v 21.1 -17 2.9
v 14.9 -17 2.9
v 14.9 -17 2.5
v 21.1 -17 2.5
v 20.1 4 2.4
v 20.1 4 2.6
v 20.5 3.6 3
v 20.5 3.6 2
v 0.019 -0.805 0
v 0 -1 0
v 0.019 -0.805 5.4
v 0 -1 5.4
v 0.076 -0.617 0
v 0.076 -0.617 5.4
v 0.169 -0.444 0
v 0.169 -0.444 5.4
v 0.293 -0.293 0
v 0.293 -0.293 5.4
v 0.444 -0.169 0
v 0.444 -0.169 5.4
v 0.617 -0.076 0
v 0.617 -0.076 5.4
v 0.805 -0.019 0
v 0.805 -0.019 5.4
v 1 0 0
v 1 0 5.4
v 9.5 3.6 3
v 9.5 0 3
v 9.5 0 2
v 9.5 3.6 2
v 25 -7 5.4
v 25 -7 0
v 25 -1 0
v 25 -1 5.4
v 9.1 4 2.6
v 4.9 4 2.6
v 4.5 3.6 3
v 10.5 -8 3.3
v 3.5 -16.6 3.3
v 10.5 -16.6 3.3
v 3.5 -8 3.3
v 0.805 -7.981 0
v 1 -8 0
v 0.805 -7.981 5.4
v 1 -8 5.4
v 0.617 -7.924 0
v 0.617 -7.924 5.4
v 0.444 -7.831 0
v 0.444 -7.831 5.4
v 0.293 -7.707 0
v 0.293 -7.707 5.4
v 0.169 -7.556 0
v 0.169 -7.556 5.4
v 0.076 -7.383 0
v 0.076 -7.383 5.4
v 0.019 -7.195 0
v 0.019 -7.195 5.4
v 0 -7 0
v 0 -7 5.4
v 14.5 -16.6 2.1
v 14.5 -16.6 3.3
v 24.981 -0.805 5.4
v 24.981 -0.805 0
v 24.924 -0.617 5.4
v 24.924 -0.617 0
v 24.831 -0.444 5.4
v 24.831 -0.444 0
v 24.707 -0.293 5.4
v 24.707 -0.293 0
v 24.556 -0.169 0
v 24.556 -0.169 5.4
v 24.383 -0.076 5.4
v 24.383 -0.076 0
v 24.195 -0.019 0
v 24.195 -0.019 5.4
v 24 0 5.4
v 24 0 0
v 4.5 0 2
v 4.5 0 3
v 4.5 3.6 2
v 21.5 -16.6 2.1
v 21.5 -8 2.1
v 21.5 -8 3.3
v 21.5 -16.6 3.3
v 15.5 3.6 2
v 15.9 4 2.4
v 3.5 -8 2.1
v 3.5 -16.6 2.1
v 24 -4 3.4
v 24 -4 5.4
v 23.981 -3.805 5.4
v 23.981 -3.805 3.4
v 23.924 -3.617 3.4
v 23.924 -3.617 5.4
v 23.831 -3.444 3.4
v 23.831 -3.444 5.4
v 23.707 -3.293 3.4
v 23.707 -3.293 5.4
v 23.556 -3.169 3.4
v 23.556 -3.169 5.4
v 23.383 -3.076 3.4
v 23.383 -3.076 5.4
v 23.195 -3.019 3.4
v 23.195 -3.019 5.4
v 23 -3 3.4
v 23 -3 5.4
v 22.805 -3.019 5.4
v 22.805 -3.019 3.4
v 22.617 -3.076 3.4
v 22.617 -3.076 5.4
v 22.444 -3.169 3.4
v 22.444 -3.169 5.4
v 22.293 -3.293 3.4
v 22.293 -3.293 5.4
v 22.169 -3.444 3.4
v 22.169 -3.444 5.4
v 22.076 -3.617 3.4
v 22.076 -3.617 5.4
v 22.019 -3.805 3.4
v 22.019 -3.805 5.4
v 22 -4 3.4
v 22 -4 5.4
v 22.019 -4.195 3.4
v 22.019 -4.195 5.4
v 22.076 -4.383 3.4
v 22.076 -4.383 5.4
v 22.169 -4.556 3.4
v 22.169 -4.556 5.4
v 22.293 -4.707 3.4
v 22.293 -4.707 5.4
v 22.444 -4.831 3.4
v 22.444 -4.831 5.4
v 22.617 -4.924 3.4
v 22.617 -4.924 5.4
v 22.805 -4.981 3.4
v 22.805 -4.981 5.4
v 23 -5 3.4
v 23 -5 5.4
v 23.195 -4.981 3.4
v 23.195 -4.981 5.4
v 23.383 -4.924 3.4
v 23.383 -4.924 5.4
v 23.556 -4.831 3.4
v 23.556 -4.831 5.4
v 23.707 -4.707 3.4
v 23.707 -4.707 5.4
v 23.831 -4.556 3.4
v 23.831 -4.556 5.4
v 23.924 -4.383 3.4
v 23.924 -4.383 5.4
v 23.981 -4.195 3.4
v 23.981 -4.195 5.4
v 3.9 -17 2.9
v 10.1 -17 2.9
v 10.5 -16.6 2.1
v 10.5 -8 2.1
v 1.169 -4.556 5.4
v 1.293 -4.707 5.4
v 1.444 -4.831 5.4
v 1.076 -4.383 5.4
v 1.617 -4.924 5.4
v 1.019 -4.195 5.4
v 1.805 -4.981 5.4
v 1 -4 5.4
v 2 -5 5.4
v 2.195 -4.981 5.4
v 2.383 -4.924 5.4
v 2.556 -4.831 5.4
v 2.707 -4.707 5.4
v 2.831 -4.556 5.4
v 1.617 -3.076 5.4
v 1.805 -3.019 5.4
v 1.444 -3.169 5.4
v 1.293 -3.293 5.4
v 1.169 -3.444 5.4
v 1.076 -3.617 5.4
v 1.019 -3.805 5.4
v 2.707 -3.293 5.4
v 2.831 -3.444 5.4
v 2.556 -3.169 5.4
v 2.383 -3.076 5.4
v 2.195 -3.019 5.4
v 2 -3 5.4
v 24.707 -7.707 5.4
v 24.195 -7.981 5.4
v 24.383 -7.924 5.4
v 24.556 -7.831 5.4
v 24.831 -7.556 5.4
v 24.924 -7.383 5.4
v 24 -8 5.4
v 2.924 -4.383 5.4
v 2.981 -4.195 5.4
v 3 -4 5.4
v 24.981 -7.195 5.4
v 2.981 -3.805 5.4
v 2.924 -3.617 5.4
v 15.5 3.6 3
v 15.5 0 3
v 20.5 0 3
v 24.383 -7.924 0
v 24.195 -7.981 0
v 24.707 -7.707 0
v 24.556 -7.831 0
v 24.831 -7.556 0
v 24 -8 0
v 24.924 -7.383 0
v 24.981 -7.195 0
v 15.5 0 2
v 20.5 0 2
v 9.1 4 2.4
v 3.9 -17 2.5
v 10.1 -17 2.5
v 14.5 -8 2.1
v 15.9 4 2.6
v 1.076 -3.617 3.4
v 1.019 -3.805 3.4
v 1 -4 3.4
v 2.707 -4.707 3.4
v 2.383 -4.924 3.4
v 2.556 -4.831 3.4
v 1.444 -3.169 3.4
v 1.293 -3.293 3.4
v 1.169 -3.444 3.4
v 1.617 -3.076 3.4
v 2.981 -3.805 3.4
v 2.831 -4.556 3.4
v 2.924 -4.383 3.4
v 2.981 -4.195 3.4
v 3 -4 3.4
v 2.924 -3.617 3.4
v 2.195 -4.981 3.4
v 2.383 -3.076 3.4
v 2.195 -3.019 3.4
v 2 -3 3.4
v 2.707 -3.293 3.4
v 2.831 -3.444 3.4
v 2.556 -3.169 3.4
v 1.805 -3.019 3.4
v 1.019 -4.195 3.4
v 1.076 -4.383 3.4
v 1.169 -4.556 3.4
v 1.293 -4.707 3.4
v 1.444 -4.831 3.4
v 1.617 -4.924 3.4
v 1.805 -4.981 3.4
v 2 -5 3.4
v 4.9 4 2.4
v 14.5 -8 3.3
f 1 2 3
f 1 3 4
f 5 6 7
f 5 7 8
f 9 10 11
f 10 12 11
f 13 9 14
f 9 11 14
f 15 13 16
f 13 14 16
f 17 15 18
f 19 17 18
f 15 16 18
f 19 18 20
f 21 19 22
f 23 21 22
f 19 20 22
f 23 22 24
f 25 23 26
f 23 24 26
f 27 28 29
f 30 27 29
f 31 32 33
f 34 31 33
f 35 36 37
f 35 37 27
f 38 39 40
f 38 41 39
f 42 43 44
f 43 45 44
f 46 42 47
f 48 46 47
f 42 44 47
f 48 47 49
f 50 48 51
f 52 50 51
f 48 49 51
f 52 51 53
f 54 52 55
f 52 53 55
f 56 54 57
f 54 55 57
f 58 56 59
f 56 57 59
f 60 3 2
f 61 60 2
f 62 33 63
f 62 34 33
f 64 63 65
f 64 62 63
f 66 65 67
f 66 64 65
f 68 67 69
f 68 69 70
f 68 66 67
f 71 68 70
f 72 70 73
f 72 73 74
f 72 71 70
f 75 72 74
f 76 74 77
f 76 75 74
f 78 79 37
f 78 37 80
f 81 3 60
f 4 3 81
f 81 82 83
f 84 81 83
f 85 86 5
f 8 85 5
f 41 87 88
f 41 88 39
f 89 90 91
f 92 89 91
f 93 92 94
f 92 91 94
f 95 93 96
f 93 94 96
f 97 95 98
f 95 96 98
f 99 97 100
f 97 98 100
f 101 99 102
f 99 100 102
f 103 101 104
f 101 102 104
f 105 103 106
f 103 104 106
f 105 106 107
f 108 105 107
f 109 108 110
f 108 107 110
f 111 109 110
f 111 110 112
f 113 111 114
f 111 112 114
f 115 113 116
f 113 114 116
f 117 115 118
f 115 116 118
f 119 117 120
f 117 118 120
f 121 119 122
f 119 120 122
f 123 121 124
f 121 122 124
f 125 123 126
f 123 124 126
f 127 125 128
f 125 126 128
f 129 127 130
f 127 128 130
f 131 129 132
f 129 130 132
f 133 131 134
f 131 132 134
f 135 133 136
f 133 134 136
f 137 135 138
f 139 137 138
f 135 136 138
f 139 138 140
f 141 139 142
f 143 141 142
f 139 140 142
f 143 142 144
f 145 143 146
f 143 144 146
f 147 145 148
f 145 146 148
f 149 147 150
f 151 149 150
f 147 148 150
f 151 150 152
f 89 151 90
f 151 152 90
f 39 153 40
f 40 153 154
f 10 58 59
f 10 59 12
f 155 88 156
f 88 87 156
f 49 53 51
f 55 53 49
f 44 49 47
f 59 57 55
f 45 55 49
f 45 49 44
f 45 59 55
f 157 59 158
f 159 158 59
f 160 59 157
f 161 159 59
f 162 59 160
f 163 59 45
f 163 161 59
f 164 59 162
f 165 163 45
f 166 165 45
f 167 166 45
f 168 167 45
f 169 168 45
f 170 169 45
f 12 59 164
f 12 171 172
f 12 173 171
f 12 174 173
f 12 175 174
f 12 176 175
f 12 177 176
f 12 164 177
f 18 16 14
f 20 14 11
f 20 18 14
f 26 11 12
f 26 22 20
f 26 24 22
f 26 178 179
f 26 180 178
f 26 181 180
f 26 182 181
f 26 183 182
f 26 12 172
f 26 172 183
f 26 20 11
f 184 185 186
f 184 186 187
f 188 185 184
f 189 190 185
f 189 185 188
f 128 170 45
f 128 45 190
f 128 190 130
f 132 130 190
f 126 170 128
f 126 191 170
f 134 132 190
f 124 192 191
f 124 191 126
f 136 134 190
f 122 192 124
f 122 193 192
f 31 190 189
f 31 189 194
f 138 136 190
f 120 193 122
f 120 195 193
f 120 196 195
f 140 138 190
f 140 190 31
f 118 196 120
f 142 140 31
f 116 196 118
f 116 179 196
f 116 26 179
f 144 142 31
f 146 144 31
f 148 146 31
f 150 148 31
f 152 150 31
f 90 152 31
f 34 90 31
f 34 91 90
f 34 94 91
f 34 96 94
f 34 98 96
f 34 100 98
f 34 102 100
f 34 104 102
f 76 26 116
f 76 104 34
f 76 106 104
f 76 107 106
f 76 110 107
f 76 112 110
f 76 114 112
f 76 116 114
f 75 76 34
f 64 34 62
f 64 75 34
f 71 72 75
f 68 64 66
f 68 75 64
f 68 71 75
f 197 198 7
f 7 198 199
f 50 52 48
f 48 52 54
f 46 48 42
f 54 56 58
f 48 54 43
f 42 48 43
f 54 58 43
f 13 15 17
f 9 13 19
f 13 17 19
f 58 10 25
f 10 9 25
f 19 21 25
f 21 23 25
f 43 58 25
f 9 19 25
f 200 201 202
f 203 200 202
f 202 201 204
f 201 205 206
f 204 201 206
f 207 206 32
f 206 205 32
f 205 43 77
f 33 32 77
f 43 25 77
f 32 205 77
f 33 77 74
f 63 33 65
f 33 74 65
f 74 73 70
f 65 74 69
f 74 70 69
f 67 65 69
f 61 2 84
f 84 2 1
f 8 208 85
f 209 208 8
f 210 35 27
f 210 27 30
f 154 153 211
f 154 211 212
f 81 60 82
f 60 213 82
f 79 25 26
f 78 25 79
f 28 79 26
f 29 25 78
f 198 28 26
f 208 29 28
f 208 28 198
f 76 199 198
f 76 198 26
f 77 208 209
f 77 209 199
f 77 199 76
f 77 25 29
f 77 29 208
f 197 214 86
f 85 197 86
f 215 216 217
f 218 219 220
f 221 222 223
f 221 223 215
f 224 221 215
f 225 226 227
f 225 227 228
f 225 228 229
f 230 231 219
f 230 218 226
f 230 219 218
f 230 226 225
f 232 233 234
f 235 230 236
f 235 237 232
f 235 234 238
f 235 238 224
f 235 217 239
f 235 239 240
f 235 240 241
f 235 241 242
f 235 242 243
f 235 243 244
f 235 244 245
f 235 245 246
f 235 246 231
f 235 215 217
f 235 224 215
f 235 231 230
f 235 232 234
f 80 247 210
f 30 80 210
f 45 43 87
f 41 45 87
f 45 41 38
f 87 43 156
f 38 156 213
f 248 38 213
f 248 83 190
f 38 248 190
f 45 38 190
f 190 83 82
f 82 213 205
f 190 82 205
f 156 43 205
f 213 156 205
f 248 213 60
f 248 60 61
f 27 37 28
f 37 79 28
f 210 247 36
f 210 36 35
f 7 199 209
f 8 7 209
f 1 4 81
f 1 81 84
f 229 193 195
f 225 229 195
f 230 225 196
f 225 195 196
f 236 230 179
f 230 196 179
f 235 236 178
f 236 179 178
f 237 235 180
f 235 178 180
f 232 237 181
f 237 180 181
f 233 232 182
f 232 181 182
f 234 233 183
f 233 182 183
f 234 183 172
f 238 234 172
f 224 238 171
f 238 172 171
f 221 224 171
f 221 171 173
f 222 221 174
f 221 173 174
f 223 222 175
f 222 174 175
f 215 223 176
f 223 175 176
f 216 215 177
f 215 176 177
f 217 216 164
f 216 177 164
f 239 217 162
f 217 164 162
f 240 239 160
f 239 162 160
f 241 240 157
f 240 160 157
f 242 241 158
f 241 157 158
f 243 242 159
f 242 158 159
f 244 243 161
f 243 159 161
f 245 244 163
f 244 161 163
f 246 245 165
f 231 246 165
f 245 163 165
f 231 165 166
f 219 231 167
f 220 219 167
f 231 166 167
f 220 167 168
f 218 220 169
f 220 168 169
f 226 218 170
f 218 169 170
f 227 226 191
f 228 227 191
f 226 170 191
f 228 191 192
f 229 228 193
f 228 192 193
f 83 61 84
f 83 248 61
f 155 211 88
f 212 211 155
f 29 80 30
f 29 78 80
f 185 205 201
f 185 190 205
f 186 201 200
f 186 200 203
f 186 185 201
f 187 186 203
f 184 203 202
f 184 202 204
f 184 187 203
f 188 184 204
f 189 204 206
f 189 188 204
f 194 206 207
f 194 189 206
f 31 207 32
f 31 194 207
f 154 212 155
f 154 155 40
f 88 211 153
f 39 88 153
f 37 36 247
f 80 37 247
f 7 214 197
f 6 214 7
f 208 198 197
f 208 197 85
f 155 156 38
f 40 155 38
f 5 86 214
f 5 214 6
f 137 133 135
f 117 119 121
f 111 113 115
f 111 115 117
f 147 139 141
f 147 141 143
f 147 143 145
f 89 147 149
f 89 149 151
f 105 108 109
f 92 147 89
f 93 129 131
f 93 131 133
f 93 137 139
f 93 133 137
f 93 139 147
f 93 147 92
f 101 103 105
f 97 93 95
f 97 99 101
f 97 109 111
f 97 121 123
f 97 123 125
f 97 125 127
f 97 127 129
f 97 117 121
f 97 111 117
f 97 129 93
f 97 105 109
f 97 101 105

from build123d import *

# Parameters (mm, degrees)
SKETCH_1_W          = 25
SKETCH_1_H          = 8
EXTRUDE_1_DEPTH     = 5.4
SKETCH_2_W          = 7
SKETCH_2_H          = 1.2
EXTRUDE_2_DEPTH     = 9
SKETCH_3_W          = 5
SKETCH_3_H          = 1
EXTRUDE_3_DEPTH     = 4
CHAMFER_2_SIZE      = 0.4
CHAMFER_3_SIZE      = 0.4
SKETCH_4_R          = 1
CUT_EXTRUDE_1_DEPTH = 2
FILLET_1_R          = 1


with BuildPart() as part:
    # 草图1 → 凸台-拉伸1 (new body)
    with BuildSketch(Plane.XY):
        with Locations((12.5, -4)):
            Rectangle(SKETCH_1_W, SKETCH_1_H)
    extrude(amount=EXTRUDE_1_DEPTH)

    # 草图2 → 凸台-拉伸2 (add)
    with BuildSketch(Plane.XZ.offset(8)):
        with Locations((7, 2.7)):
            Rectangle(SKETCH_2_W, SKETCH_2_H)
        with Locations((18, 2.7)):
            Rectangle(SKETCH_2_W, SKETCH_2_H)
    extrude(amount=EXTRUDE_2_DEPTH)

    # 草图3 → 凸台-拉伸3 (add)
    with BuildSketch(Plane(origin=(0, 0, 0), x_dir=(1, 0, 0), z_dir=(0, 1, 0))):
        with Locations((7, -2.5)):
            Rectangle(SKETCH_3_W, SKETCH_3_H)
        with Locations((18, -2.5)):
            Rectangle(SKETCH_3_W, SKETCH_3_H)
    extrude(amount=EXTRUDE_3_DEPTH)

    # 倒角2
    chamfer_2_edges = [part.edges().sort_by_distance(p)[0] for p in [
        (3.5, -17, 2.7),
        (10.5, -17, 2.7),
        (14.5, -17, 2.7),
        (21.5, -17, 2.7),
        (4.5, 4, 2.5),
        (9.5, 4, 2.5),
        (15.5, 4, 2.5),
        (20.5, 4, 2.5),
    ]]
    chamfer(chamfer_2_edges, length=CHAMFER_2_SIZE)

    # 倒角3
    chamfer_3_edges = [part.edges().sort_by_distance(p)[0] for p in [
        (7, 4, 2),
        (7, 4, 3),
        (18, 4, 2),
        (18, 4, 3),
        (18, -17, 2.1),
        (18, -17, 3.3),
        (7, -17, 2.1),
        (7, -17, 3.3),
    ]]
    chamfer(chamfer_3_edges, length=CHAMFER_3_SIZE)

    # 草图4 → 切除-拉伸1 (cut)
    with BuildSketch(Plane.XY.offset(5.4)):
        with Locations((2, -4)):
            Circle(SKETCH_4_R)
        with Locations((23, -4)):
            Circle(SKETCH_4_R)
    extrude(amount=-CUT_EXTRUDE_1_DEPTH, mode=Mode.SUBTRACT)

    # 圆角1
    fillet_1_edges = [part.edges().sort_by_distance(p)[0] for p in [
        (0, 0, 2.7),
        (25, 0, 2.7),
        (25, -8, 2.7),
        (0, -8, 2.7),
    ]]
    fillet(fillet_1_edges, radius=FILLET_1_R)


solid = part.part
